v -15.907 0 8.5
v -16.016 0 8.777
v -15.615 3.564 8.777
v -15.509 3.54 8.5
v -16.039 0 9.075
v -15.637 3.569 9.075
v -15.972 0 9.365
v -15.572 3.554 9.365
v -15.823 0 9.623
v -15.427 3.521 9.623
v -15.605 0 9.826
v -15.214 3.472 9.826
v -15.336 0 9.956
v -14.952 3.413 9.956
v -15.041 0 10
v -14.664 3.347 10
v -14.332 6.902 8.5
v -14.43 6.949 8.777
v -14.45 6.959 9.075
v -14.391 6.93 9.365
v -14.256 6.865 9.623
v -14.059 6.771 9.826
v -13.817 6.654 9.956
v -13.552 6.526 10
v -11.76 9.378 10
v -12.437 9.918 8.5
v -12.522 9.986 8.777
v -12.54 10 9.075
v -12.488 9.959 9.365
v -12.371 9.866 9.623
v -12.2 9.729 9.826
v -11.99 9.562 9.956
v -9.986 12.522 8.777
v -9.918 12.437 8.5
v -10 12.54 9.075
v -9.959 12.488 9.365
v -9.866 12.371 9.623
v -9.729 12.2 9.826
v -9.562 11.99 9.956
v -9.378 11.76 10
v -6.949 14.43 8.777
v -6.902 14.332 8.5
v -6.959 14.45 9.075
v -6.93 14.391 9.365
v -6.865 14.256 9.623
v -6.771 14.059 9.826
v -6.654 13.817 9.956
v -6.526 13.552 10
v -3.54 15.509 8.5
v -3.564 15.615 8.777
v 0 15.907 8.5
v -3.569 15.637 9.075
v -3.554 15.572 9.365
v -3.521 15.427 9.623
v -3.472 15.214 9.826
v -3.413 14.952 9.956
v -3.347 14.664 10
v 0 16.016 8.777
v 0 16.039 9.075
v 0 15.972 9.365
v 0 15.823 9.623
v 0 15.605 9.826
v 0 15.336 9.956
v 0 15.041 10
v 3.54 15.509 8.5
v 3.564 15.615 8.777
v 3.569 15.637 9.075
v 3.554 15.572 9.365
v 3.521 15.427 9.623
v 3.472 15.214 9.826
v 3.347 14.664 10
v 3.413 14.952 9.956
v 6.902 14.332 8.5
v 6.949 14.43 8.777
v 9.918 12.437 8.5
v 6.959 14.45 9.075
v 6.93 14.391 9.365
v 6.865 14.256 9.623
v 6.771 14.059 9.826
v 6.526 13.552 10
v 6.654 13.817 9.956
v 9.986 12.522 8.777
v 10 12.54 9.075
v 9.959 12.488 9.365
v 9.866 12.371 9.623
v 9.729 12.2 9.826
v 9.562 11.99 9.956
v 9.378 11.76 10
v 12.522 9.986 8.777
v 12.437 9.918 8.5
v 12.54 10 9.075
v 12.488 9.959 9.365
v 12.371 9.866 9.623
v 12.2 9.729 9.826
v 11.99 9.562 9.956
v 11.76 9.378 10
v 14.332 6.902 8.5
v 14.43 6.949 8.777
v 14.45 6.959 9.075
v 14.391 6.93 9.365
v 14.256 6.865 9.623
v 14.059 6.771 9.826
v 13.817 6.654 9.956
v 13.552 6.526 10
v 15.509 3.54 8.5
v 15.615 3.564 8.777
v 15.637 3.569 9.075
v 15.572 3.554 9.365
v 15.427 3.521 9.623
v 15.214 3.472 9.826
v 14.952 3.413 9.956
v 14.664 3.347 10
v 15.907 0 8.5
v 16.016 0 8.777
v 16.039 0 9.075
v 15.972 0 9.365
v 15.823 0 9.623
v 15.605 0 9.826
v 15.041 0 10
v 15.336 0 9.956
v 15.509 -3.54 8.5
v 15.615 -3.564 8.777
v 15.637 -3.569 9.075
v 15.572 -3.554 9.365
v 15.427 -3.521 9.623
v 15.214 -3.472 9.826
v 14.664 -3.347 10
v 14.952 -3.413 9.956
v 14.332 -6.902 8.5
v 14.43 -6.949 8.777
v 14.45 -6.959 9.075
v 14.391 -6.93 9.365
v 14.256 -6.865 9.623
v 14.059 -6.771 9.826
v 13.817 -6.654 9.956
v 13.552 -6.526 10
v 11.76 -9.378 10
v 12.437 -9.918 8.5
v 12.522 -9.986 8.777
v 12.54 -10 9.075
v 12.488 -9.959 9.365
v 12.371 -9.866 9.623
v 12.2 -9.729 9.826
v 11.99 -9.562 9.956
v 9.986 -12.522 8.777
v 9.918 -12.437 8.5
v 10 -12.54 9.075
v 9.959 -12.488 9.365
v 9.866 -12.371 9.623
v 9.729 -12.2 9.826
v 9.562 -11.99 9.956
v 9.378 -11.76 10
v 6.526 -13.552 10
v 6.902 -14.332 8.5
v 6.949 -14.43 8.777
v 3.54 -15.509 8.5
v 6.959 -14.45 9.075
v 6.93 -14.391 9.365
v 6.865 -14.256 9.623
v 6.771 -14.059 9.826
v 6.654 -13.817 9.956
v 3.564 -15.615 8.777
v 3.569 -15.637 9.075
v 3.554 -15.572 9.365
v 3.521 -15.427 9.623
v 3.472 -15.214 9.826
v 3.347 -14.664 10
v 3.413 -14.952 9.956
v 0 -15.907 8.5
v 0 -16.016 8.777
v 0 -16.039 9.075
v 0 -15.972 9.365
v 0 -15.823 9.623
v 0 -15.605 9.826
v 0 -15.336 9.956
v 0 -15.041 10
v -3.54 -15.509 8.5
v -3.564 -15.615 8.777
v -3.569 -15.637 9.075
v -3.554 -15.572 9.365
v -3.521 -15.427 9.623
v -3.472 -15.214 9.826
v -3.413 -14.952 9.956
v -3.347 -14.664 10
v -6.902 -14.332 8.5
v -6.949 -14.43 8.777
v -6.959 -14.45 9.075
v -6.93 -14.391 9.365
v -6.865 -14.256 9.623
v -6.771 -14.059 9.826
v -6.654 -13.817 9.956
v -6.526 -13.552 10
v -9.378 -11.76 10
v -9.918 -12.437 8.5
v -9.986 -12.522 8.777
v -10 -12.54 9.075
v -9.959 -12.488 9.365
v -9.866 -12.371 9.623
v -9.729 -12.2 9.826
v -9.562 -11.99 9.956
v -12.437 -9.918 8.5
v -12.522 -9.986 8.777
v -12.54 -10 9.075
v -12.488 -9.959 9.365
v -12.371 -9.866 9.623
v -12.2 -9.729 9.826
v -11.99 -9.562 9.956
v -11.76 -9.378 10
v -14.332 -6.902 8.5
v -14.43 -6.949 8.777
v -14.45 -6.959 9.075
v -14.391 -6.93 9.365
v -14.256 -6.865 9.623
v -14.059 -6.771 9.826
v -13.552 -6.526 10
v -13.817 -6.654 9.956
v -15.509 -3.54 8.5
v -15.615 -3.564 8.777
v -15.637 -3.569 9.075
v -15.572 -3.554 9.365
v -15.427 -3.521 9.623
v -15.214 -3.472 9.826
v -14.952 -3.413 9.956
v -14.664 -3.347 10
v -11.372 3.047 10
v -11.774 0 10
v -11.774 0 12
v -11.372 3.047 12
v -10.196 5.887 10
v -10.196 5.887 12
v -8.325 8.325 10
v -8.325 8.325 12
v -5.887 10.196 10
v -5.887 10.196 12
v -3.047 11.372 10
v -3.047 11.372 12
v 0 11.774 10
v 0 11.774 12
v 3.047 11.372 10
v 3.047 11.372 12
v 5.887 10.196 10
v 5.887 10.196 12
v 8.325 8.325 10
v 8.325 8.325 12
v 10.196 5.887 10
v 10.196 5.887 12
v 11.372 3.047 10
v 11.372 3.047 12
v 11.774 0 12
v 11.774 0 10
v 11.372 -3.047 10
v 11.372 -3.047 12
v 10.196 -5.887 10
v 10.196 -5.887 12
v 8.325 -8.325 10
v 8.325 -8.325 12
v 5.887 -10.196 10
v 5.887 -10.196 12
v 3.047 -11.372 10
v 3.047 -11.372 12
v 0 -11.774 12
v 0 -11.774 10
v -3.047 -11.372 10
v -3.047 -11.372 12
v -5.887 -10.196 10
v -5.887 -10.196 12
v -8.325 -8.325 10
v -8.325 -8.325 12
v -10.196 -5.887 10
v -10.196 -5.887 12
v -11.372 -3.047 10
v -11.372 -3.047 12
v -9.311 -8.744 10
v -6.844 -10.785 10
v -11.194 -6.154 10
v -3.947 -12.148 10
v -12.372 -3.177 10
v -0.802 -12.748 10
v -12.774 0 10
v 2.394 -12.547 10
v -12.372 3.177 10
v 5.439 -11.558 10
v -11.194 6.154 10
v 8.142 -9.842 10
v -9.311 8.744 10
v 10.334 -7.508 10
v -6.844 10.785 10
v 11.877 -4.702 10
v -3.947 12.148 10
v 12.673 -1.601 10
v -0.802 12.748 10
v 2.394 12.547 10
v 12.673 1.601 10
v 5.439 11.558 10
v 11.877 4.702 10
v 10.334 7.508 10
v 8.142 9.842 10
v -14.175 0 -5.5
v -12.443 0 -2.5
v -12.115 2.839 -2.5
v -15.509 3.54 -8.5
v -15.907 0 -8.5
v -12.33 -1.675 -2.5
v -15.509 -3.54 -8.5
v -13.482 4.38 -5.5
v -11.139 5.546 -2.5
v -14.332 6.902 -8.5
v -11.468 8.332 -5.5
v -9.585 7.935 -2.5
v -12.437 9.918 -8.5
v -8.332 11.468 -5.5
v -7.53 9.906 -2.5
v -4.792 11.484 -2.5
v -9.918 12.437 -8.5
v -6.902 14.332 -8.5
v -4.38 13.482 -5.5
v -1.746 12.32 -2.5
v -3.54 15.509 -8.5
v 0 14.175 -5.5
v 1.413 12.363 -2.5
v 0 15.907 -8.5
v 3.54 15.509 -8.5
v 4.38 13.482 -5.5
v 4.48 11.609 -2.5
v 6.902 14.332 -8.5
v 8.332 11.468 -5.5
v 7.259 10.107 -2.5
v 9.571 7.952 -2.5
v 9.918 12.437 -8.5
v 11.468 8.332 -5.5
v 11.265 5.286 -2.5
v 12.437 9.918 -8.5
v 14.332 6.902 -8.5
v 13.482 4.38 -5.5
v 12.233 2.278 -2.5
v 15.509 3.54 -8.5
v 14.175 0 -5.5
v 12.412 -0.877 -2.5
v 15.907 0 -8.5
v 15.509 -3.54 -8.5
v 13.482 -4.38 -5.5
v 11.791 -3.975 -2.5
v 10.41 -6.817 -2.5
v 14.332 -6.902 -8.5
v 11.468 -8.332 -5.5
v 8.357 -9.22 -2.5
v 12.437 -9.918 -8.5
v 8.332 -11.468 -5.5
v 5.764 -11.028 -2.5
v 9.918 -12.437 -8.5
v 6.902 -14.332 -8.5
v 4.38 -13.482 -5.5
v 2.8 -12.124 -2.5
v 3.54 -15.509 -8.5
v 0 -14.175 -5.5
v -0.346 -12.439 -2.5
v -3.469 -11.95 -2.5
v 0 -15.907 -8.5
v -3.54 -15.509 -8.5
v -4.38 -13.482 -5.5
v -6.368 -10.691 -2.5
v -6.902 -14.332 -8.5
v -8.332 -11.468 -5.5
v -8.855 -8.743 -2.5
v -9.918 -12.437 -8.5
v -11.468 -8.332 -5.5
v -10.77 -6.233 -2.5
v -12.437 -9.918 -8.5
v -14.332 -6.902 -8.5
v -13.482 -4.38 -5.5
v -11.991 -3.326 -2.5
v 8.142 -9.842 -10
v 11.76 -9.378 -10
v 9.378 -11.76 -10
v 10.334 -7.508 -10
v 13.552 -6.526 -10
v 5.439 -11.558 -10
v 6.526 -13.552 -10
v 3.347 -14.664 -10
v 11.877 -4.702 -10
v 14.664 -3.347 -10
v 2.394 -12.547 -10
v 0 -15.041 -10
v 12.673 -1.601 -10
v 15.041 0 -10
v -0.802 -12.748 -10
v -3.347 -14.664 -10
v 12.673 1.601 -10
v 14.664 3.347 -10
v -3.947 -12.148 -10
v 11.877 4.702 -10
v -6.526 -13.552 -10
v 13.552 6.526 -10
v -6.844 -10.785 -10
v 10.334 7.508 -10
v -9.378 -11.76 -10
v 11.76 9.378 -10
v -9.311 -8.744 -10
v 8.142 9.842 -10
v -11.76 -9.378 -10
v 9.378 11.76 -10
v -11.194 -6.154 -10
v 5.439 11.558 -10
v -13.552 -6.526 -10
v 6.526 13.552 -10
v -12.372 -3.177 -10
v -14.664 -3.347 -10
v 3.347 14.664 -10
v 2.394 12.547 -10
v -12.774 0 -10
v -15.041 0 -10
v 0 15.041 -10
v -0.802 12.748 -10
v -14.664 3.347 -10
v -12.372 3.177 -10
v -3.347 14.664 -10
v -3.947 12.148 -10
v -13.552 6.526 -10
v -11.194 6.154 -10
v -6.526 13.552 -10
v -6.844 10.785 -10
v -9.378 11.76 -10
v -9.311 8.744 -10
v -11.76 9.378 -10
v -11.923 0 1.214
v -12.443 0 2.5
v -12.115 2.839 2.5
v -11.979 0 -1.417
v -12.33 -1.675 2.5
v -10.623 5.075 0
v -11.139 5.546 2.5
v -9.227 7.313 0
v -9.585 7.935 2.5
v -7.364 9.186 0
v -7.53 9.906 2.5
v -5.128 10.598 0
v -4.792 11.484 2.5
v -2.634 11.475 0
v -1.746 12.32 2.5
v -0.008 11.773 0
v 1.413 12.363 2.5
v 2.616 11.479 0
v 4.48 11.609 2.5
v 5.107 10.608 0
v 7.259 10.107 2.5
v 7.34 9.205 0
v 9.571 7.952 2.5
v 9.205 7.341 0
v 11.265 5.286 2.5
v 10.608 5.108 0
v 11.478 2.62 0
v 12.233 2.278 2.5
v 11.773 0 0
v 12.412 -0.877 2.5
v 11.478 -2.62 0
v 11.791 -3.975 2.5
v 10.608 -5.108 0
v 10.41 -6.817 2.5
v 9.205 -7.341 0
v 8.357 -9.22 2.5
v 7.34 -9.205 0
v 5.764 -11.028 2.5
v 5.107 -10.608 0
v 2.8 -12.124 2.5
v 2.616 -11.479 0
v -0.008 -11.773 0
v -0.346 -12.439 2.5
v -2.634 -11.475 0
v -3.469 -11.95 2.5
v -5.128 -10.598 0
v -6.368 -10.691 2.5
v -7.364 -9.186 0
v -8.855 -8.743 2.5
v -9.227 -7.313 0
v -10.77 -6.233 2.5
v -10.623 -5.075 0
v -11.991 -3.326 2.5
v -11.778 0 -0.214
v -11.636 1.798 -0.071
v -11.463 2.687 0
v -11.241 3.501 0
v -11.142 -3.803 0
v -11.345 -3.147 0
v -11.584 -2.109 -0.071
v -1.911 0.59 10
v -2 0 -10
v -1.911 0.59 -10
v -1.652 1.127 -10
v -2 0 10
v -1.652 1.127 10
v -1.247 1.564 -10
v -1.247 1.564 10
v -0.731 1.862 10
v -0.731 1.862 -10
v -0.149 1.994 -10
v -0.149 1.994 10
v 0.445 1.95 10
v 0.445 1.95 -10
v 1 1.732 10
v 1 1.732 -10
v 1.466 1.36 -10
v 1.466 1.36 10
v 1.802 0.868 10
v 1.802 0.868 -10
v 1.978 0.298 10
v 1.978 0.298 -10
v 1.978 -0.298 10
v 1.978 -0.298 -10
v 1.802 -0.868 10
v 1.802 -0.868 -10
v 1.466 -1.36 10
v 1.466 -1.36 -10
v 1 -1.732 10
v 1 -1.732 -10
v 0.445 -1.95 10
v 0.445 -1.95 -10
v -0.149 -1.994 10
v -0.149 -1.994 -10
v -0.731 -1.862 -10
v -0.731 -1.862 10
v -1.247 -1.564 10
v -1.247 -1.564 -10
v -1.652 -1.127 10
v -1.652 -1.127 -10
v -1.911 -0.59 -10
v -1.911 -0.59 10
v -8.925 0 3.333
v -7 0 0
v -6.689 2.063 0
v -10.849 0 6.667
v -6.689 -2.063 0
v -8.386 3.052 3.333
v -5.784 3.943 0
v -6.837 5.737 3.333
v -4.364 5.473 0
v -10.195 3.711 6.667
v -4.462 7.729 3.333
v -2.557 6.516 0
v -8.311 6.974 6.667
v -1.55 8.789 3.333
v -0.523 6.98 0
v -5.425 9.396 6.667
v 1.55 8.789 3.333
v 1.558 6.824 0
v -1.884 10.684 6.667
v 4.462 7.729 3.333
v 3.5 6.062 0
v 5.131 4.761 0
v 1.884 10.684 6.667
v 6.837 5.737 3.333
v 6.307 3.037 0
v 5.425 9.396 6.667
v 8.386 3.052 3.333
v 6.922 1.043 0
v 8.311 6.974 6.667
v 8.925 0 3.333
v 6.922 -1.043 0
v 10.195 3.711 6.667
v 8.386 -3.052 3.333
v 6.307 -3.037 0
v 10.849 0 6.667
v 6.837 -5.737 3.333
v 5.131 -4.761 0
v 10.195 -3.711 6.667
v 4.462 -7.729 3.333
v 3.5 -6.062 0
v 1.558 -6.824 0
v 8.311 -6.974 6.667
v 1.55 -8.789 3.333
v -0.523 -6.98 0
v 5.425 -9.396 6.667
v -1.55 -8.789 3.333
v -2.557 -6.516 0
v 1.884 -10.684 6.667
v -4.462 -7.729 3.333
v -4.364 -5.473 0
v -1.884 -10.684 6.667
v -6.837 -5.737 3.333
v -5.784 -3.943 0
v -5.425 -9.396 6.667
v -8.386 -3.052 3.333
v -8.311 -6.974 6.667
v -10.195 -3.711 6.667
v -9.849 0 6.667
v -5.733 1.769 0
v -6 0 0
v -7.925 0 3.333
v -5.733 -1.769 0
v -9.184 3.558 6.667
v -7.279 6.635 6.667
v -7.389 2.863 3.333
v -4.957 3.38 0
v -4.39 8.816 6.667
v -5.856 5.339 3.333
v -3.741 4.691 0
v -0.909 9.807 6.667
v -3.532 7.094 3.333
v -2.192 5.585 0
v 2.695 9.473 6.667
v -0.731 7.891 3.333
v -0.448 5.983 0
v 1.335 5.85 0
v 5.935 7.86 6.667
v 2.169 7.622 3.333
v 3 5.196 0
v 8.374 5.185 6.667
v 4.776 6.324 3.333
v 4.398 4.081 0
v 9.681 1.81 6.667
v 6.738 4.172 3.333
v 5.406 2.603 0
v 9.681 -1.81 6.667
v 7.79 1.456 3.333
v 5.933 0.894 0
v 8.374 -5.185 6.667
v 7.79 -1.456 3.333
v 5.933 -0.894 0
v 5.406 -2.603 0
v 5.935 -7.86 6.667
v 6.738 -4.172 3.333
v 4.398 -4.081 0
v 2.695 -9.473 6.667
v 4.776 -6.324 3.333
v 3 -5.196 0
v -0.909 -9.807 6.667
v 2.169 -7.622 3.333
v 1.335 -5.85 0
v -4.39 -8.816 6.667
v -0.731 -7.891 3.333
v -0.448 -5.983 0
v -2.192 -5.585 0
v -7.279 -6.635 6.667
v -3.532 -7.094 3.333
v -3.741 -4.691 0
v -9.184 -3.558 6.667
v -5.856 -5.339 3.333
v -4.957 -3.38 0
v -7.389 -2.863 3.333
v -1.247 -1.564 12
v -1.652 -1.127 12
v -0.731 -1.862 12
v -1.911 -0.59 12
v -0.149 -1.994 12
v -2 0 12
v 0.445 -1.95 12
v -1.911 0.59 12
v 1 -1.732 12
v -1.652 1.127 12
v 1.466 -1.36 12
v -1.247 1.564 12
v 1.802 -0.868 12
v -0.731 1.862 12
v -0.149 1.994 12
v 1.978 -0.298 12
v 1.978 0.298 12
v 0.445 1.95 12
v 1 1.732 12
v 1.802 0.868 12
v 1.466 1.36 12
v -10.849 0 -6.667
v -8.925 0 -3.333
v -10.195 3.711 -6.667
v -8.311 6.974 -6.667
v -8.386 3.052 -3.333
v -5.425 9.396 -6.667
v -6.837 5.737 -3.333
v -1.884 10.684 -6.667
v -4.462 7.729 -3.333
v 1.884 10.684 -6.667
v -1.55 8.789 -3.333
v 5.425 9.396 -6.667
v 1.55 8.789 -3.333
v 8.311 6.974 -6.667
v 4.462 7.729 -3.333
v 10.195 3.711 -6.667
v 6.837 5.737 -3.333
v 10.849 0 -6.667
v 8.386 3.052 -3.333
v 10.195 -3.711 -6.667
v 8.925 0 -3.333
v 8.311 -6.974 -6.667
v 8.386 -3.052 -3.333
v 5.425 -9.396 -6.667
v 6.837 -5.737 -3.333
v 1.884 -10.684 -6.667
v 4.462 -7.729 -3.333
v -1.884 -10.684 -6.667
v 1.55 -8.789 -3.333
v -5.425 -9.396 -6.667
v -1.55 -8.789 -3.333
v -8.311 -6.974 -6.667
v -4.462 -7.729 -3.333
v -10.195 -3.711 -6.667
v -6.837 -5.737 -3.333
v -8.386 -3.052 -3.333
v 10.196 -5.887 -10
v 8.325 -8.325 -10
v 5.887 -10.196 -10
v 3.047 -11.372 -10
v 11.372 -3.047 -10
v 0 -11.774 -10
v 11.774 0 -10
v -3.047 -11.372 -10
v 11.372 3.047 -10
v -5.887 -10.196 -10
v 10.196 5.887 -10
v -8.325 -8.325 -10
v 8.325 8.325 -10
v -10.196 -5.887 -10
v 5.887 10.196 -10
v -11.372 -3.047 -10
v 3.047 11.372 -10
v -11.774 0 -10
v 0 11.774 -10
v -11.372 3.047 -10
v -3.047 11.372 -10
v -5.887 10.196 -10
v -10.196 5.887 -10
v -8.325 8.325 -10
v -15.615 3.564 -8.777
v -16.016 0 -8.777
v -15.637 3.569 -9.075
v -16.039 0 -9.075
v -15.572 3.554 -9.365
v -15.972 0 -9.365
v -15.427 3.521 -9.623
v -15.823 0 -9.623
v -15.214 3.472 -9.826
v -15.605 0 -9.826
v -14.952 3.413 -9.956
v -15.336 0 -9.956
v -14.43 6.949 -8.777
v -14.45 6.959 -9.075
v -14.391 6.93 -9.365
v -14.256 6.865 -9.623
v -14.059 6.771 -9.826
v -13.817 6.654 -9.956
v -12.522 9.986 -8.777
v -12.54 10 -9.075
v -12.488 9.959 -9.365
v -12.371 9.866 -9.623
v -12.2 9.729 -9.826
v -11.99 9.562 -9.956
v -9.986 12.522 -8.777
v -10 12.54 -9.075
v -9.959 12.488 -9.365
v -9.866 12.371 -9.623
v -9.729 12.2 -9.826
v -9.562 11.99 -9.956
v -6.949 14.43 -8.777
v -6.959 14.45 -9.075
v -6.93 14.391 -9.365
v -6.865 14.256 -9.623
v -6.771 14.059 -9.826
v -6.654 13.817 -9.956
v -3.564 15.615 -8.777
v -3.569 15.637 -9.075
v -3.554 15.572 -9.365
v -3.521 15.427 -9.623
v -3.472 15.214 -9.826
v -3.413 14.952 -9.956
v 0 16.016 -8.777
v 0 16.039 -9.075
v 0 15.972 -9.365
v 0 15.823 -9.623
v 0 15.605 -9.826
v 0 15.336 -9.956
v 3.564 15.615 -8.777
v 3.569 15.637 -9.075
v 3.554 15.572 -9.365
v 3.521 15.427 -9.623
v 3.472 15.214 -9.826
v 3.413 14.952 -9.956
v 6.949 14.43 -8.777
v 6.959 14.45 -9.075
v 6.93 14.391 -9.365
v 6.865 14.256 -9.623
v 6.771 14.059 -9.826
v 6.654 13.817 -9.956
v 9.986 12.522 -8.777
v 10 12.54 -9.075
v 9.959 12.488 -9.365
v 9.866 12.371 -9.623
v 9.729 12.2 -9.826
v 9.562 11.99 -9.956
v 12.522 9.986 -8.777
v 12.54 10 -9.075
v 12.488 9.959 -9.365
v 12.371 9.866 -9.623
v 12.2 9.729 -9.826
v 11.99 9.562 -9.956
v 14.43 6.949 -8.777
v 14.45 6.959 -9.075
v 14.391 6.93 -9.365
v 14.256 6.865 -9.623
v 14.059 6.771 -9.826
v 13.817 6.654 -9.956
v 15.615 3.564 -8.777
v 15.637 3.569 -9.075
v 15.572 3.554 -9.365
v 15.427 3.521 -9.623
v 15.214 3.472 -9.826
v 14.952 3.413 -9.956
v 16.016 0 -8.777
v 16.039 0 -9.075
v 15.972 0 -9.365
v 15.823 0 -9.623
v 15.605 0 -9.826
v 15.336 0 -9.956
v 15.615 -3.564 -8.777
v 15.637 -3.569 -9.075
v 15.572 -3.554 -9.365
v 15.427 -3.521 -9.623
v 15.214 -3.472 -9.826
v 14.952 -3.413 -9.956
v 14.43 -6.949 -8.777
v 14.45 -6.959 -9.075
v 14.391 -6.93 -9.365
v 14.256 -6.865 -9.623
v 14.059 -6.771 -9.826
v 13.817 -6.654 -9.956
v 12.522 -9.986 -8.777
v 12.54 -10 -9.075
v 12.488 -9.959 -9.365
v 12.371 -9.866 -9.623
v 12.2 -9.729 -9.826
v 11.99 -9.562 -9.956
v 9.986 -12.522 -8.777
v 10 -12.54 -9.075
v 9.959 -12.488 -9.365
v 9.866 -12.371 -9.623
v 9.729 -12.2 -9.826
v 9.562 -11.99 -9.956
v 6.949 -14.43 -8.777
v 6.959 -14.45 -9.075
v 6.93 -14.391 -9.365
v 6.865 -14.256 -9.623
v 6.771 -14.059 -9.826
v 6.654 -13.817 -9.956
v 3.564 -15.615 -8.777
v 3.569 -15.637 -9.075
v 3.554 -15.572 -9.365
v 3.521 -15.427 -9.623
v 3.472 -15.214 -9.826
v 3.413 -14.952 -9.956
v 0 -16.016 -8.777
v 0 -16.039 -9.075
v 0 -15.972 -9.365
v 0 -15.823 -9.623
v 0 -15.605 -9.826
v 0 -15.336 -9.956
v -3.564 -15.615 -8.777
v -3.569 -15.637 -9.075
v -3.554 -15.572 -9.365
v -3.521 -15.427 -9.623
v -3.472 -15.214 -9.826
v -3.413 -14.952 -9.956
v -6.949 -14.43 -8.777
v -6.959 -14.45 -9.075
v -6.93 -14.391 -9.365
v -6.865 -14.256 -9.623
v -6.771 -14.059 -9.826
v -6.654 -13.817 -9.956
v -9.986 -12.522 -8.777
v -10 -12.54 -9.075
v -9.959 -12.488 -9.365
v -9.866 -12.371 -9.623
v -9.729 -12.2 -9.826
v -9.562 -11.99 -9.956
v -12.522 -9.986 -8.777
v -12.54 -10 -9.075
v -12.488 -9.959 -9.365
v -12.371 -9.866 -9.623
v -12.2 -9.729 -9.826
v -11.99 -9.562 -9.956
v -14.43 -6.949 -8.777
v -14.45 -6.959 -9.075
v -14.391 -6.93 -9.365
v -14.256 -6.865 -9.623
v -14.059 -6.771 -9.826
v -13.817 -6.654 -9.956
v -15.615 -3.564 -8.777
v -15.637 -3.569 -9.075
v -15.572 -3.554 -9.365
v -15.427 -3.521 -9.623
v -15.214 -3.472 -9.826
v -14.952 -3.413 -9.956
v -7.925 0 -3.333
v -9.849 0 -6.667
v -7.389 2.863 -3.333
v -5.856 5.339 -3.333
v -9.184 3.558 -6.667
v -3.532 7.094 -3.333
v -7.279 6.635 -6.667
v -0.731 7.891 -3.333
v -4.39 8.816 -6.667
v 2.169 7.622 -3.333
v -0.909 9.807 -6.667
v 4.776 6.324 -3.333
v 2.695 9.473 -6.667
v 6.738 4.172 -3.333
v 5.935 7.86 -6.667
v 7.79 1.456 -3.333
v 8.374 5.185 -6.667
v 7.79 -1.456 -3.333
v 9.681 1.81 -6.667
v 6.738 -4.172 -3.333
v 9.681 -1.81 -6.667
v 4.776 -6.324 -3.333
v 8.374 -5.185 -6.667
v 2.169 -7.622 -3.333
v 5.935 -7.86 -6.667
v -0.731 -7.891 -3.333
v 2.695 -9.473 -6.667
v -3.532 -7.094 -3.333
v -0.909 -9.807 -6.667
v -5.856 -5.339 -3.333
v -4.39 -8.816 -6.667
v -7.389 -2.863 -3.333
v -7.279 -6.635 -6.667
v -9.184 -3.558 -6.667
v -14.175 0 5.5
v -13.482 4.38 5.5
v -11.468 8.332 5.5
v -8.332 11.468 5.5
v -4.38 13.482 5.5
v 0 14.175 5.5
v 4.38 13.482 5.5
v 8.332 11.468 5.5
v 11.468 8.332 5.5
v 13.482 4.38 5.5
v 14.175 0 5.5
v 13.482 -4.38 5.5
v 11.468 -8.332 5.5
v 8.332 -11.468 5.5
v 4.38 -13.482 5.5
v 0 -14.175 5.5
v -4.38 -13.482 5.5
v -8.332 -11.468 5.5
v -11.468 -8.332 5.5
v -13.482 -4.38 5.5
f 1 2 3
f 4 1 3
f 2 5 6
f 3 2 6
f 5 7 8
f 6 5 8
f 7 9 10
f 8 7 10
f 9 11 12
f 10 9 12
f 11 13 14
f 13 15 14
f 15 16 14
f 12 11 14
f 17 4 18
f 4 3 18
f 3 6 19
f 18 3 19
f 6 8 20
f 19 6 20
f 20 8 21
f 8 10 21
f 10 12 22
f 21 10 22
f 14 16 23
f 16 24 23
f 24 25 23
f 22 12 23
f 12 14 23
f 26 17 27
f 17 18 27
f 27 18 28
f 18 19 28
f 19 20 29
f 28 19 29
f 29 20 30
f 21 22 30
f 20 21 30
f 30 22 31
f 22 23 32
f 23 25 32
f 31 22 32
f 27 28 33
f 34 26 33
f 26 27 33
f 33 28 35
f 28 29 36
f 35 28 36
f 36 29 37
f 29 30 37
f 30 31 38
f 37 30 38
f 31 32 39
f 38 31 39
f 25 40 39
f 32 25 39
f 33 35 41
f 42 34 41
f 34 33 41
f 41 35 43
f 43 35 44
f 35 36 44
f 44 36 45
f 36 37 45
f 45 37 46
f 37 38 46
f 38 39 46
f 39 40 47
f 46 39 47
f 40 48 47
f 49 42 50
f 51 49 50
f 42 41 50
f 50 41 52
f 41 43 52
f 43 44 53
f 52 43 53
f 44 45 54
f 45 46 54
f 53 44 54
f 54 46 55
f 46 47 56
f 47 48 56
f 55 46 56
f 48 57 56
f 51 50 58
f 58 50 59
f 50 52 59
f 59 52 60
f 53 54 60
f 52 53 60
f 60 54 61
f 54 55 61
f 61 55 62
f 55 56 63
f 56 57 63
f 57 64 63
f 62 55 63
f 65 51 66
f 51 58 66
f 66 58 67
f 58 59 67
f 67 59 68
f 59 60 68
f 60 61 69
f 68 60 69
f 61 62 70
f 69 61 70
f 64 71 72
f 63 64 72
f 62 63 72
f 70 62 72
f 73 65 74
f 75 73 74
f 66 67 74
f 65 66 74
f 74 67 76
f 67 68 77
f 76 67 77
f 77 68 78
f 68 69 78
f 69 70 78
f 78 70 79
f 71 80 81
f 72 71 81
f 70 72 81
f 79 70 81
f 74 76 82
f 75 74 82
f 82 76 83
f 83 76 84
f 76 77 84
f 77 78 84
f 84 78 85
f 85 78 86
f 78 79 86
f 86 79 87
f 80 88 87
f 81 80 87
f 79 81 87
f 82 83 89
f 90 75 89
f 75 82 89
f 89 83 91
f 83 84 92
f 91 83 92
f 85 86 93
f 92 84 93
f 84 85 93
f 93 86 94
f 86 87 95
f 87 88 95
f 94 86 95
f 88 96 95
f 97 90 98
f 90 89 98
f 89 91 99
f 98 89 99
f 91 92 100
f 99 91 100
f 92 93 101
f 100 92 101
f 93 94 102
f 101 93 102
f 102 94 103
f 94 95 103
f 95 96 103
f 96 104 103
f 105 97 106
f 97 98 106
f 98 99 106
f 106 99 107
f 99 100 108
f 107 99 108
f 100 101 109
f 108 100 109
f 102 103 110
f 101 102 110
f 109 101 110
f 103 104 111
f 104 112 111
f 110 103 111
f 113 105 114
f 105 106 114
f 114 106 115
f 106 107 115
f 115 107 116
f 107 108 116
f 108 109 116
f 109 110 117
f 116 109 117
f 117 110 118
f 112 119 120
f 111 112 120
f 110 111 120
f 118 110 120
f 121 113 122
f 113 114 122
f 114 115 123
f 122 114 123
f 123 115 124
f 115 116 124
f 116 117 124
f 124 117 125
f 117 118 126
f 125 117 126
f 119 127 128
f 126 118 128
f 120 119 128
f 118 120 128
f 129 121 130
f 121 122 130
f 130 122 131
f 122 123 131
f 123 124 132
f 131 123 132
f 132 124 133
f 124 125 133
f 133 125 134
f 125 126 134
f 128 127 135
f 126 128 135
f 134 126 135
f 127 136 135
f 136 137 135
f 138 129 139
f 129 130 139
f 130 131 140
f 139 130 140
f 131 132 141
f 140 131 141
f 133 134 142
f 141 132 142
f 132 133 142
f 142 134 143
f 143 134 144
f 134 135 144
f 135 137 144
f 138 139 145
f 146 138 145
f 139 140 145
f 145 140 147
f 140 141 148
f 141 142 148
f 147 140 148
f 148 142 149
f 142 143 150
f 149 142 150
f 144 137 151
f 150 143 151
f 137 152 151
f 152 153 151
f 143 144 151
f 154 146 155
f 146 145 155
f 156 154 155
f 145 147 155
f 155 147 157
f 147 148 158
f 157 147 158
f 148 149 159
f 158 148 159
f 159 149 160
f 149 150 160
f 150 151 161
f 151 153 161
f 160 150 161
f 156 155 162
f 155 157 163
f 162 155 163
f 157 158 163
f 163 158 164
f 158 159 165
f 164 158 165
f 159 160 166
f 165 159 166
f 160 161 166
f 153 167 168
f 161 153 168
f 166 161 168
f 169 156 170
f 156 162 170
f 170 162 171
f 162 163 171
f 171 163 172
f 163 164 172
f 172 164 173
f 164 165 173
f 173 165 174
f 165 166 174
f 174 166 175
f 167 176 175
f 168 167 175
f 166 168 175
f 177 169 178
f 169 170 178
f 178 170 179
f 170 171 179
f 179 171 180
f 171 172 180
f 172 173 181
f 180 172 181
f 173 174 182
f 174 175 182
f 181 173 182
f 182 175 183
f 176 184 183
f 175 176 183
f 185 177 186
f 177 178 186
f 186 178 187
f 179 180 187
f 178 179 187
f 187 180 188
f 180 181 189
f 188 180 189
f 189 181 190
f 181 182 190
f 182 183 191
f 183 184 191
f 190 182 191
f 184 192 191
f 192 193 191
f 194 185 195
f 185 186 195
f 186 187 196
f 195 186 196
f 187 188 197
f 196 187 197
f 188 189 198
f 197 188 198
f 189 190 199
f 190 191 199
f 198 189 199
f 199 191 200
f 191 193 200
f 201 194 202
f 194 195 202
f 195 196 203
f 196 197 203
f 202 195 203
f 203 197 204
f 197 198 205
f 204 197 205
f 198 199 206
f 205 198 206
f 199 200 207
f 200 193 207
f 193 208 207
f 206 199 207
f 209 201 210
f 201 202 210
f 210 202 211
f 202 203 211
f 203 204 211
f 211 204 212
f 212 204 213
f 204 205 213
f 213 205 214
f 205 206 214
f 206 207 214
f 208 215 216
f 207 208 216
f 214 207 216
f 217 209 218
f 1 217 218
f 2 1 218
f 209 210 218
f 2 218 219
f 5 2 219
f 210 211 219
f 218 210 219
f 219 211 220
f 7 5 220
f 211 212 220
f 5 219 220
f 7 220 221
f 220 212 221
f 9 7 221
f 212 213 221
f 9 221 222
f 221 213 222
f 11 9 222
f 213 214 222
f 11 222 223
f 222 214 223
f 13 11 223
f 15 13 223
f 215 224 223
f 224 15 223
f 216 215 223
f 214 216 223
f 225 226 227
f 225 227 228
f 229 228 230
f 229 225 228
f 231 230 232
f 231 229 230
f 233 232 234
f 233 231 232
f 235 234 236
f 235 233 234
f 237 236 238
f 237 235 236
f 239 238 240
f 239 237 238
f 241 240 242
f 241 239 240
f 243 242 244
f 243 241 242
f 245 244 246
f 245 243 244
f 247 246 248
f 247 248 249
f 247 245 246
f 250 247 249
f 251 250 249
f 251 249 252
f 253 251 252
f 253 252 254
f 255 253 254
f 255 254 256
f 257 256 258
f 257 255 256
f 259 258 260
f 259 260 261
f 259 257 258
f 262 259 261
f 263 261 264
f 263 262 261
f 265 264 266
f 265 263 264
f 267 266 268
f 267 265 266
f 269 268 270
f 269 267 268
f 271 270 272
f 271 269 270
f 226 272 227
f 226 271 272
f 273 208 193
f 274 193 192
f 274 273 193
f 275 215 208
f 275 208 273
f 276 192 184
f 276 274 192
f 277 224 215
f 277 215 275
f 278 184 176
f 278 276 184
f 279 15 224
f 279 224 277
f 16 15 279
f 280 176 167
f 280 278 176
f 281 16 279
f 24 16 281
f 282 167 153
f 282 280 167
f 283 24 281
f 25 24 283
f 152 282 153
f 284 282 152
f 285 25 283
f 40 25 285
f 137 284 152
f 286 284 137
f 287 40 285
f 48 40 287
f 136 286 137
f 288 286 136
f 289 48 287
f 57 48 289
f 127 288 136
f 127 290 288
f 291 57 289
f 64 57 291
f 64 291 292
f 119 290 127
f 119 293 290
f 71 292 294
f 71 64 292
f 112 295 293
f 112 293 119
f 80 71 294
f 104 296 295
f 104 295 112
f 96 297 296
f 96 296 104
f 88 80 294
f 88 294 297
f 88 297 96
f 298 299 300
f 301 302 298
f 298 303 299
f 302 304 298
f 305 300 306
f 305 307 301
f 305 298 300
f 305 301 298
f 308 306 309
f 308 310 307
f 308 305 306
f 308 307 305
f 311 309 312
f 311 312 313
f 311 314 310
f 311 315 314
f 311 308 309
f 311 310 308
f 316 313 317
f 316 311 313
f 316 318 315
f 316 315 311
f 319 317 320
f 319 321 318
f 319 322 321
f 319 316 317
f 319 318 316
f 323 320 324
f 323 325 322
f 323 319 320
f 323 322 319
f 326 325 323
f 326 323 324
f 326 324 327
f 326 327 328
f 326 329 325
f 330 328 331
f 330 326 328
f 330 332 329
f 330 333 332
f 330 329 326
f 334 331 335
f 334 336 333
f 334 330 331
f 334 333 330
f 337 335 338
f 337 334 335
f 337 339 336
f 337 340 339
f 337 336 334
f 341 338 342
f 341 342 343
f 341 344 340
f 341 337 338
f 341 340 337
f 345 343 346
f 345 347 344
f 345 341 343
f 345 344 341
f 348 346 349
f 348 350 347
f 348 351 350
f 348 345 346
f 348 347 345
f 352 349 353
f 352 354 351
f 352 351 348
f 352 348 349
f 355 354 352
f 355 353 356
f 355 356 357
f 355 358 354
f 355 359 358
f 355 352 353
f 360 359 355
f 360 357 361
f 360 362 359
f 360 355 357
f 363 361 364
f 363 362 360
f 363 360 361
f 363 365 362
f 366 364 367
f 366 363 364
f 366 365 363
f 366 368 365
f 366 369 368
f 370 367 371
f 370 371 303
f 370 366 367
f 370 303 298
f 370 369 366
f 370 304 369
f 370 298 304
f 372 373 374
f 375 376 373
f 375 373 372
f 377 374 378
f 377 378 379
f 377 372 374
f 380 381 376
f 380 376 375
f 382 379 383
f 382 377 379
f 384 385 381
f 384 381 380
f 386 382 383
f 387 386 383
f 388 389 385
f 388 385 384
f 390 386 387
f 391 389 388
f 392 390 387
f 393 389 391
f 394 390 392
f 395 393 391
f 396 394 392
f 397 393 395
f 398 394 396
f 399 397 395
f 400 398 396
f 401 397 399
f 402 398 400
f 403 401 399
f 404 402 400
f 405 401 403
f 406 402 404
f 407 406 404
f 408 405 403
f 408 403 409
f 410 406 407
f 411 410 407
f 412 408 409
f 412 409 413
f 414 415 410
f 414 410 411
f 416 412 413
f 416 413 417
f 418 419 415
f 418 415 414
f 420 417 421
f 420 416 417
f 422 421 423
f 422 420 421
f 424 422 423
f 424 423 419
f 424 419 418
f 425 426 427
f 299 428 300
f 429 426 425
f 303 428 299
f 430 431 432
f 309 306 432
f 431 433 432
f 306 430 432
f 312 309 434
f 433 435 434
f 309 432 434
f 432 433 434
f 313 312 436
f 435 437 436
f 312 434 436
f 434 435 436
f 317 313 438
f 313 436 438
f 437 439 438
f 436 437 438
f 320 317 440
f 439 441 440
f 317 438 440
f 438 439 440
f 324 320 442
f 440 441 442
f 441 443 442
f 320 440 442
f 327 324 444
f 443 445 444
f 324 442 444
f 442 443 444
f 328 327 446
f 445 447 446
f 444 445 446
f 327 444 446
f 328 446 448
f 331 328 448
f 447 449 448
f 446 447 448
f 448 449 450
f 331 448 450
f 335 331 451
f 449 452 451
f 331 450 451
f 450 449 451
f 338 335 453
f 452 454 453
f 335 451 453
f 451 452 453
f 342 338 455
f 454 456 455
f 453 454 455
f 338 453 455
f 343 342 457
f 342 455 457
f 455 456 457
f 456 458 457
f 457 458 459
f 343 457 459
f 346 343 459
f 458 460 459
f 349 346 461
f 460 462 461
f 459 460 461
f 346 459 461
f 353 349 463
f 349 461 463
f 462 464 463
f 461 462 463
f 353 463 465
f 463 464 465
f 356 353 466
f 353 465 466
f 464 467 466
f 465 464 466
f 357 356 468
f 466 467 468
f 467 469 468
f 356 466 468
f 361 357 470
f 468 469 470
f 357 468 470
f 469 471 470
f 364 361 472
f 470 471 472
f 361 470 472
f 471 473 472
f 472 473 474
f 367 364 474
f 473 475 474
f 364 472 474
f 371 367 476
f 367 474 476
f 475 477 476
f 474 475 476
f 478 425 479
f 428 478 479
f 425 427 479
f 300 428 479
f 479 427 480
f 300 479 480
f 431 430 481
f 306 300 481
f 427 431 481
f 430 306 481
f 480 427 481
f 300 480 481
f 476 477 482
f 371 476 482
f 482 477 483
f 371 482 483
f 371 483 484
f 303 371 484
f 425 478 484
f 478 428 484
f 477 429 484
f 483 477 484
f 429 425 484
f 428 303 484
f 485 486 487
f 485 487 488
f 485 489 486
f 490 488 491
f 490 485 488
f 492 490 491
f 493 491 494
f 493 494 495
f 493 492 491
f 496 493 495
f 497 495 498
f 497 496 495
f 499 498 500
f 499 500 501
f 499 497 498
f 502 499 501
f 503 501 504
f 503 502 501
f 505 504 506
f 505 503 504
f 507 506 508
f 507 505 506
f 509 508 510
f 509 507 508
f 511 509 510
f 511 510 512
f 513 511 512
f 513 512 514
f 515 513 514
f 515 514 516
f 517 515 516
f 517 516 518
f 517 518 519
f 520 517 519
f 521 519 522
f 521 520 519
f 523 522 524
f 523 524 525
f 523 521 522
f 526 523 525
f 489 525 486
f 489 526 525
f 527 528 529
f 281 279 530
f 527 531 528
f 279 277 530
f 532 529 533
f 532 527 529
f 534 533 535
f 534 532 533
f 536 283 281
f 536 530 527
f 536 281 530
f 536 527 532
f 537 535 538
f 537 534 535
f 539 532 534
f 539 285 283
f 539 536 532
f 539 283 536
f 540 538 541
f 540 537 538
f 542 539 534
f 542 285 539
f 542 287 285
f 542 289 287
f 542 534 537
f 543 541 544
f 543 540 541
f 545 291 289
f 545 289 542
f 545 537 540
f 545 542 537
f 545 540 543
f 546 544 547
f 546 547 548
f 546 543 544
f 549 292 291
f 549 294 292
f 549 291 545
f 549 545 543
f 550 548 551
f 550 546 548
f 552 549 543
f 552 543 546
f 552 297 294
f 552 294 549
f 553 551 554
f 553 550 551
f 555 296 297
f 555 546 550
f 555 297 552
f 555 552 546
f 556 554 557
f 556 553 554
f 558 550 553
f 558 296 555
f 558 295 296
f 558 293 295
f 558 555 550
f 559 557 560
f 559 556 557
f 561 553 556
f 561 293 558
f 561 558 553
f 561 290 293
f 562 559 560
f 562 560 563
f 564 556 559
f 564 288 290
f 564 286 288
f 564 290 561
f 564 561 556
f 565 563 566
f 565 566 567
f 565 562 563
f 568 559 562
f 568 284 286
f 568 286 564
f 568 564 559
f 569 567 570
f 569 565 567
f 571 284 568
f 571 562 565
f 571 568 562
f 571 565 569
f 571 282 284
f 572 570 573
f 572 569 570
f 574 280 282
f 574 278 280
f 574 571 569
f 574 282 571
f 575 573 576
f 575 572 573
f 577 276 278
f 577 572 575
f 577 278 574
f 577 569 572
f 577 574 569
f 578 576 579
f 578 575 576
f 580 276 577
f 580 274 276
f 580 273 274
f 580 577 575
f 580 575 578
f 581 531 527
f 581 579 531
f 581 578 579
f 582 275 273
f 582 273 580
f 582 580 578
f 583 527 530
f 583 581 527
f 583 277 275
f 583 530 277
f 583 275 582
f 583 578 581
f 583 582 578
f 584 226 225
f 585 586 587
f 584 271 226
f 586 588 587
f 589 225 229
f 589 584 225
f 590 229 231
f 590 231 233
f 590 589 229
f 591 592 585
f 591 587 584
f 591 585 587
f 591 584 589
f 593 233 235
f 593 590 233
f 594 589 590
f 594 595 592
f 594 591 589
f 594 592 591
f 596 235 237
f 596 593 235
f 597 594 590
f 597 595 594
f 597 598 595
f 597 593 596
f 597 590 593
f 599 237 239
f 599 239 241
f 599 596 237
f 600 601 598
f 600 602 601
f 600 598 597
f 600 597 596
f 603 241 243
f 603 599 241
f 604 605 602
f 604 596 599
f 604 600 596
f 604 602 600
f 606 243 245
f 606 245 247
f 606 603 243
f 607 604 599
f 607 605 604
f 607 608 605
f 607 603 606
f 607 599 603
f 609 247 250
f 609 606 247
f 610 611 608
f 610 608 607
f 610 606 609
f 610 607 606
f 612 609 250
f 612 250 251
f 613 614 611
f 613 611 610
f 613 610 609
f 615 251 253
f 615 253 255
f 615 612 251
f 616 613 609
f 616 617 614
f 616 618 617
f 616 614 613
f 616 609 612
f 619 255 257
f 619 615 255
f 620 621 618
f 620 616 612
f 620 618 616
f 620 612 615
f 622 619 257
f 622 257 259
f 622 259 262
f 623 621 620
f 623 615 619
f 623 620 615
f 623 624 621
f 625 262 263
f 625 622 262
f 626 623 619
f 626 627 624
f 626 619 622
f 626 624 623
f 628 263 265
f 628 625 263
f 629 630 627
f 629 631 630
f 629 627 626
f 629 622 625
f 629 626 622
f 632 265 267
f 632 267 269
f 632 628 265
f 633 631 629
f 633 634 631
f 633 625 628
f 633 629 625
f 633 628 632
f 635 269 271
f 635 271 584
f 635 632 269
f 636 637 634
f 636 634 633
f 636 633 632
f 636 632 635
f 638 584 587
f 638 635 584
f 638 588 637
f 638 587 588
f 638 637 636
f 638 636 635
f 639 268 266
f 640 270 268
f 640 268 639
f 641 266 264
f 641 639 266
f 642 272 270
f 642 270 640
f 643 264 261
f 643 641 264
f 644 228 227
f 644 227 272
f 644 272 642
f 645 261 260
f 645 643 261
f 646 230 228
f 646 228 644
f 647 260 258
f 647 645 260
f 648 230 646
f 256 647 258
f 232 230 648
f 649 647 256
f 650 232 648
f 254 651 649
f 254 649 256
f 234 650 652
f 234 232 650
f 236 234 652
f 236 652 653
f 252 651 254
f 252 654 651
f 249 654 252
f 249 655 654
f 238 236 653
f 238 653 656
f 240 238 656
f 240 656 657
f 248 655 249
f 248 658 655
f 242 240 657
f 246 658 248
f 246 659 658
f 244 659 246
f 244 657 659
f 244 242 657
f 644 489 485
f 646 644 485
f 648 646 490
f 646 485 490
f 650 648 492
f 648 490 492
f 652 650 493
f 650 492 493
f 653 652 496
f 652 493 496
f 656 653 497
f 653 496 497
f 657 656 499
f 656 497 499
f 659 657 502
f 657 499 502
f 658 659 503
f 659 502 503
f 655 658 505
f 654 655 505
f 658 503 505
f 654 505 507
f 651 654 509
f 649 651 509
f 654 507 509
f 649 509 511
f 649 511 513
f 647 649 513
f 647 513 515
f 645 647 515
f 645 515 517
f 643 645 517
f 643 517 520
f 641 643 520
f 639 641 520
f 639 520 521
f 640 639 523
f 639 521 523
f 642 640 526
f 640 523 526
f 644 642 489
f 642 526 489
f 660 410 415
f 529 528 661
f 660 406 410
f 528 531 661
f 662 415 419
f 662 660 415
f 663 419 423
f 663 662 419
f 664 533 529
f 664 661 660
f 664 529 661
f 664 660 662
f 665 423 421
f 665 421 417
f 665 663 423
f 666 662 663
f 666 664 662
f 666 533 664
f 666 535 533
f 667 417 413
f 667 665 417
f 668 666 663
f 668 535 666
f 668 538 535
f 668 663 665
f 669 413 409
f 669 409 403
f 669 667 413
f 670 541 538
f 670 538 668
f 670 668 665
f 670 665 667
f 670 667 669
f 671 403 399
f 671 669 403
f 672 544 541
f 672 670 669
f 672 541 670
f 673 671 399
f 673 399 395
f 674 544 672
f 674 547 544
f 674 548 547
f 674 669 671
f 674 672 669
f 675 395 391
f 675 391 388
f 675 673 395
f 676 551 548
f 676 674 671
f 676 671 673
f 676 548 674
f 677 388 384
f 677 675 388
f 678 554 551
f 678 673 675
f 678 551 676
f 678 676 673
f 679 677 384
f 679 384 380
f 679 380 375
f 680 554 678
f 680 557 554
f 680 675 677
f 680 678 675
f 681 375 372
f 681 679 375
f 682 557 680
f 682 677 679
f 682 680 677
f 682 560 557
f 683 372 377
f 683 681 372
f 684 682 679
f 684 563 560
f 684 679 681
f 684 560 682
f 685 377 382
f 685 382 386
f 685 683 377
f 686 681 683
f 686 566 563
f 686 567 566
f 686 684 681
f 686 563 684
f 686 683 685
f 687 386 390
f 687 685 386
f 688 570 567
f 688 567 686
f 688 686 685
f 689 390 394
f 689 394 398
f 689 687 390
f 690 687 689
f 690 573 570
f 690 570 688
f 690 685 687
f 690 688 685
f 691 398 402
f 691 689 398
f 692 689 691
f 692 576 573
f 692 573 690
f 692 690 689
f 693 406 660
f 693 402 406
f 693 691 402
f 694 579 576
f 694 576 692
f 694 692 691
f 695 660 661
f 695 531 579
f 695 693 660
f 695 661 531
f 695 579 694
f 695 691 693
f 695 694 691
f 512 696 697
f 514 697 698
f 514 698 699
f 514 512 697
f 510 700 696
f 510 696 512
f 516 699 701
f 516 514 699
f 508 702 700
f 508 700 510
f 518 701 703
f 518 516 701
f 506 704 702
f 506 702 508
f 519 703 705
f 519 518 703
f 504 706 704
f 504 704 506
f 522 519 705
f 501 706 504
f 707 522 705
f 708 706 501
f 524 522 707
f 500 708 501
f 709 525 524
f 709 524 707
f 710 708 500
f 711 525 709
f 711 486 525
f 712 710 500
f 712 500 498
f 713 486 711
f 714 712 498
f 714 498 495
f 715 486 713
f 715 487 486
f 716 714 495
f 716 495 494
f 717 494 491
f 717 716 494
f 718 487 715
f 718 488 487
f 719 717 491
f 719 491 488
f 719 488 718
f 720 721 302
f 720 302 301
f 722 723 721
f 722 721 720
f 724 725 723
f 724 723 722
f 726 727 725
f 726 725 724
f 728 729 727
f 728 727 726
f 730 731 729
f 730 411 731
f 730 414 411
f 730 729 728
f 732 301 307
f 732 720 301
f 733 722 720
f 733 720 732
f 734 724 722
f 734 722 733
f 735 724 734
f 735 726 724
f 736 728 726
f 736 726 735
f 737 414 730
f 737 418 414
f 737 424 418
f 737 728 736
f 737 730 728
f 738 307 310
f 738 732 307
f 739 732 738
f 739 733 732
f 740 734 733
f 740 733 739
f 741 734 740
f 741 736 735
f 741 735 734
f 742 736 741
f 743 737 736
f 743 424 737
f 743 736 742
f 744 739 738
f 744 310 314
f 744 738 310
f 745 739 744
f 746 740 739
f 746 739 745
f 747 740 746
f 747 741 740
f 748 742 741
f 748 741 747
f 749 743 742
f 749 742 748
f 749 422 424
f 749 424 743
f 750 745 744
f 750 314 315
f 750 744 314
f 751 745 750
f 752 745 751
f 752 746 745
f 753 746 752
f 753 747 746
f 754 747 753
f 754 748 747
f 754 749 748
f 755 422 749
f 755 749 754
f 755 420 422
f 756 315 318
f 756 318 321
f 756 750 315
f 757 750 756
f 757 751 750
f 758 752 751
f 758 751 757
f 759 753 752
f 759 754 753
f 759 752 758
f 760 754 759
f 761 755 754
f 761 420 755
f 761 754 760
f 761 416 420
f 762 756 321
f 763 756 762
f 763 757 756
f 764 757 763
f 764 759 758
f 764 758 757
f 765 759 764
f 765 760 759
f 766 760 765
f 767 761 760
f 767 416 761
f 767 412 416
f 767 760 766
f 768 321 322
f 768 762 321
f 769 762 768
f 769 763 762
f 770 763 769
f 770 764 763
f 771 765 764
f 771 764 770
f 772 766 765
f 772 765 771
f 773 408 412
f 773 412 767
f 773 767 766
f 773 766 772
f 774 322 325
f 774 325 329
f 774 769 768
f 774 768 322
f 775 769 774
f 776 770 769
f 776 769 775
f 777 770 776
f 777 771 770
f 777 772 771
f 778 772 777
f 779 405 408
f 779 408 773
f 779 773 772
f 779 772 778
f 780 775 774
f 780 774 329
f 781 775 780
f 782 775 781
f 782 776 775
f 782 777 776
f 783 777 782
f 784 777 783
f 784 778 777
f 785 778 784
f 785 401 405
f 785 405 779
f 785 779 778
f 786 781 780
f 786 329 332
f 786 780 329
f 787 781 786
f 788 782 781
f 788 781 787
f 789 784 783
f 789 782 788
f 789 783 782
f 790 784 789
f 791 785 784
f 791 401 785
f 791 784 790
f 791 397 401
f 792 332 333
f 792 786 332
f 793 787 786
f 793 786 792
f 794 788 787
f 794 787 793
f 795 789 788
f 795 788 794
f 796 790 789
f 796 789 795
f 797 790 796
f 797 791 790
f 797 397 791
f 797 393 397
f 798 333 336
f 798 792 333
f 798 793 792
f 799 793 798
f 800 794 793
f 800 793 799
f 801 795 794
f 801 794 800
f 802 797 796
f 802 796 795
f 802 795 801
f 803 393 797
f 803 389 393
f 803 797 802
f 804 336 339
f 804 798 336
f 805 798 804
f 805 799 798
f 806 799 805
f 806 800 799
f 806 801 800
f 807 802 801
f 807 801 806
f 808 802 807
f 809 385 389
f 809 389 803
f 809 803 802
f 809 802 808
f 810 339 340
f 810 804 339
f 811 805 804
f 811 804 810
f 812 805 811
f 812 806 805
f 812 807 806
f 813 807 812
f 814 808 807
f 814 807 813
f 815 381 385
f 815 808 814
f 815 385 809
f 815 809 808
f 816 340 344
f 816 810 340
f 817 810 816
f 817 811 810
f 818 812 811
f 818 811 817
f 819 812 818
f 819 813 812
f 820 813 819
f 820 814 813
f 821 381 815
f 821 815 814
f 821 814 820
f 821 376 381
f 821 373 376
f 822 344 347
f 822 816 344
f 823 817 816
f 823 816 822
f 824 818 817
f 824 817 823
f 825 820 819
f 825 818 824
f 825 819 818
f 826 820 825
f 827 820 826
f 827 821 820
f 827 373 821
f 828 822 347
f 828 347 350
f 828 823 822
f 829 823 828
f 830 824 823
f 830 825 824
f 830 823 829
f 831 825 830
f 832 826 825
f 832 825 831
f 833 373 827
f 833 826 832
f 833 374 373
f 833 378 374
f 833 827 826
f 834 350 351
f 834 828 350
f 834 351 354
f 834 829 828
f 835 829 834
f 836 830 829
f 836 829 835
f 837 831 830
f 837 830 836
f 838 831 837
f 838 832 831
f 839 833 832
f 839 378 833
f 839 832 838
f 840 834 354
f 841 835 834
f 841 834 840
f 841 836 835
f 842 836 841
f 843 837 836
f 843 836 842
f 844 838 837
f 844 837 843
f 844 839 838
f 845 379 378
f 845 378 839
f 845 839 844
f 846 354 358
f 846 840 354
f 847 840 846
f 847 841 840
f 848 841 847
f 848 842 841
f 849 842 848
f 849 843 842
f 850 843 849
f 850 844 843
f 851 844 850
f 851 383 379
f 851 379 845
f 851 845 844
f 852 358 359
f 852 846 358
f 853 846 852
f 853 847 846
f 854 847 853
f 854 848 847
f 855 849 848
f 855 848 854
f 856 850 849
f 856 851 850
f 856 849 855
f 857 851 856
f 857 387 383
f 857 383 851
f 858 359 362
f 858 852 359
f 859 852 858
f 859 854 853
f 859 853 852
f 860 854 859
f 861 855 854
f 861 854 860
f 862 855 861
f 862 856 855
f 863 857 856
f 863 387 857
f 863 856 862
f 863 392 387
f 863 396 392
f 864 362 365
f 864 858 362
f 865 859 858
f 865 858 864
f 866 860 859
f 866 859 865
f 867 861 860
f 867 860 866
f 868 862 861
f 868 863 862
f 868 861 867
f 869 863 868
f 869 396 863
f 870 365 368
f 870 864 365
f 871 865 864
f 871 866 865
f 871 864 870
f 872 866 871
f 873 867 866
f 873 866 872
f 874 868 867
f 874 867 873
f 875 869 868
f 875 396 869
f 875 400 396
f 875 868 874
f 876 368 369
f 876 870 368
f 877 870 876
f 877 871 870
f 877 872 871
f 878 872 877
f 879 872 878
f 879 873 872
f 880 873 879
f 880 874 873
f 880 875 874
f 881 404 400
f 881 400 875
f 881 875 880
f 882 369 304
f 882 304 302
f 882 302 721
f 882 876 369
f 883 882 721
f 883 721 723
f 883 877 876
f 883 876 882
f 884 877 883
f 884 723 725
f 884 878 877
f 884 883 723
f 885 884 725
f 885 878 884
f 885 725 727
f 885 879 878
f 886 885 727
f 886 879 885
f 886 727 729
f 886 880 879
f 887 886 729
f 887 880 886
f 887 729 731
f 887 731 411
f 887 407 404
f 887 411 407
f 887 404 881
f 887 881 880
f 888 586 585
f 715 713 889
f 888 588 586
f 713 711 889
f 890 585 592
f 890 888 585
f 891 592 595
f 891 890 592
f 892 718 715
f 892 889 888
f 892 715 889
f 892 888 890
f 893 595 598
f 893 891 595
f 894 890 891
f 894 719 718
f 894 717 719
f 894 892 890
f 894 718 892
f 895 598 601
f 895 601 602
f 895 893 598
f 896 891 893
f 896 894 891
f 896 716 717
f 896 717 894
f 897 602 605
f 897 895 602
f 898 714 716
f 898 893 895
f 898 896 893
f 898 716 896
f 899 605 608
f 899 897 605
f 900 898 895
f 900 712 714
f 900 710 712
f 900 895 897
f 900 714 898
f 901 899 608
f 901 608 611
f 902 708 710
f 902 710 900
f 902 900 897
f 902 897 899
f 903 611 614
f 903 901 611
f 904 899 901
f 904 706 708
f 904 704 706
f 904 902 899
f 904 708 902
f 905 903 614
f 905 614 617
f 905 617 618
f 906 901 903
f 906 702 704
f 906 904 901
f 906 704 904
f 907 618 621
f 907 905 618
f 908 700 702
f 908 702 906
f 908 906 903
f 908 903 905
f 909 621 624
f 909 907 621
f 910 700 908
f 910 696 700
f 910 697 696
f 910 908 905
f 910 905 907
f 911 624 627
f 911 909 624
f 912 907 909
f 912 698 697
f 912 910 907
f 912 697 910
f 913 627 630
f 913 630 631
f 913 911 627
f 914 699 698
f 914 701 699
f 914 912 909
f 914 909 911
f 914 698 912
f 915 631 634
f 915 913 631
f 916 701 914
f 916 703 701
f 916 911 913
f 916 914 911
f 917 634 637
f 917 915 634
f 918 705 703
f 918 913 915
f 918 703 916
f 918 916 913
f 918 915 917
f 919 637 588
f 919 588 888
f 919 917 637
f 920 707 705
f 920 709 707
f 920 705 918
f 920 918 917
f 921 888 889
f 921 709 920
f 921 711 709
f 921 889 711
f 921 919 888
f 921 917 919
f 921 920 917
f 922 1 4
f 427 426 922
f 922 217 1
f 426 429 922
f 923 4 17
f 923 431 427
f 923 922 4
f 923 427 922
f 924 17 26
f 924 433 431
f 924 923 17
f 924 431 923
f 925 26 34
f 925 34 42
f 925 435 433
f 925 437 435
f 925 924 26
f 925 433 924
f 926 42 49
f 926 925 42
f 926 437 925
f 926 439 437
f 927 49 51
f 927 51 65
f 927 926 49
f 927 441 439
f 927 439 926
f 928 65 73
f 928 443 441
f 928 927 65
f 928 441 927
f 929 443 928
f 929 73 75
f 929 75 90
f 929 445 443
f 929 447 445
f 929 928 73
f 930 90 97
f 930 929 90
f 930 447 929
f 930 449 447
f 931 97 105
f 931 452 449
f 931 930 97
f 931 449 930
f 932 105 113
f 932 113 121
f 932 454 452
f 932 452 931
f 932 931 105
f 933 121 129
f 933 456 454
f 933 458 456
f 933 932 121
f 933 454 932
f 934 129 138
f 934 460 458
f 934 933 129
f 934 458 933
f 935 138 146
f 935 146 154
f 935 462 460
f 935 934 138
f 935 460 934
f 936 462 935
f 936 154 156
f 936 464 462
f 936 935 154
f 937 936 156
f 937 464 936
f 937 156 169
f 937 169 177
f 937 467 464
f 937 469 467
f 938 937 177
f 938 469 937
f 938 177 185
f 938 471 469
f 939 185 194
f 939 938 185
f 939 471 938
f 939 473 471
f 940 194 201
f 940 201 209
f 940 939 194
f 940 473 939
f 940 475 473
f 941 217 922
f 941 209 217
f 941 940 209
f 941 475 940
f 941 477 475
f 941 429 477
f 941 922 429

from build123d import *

# Parameters (mm, degrees)
F2_R     = 5
F3_R     = 1
F4_DEPTH = 2


with BuildPart() as f1:
    # F0 (on Front) → F1 (revolve)
    with BuildSketch(Plane.XZ):
        Polygon((-2, -10), (-2, 10), (-11.7735026919, 10), (-6, 0), (-11.7735026919, -10), align=None)
    revolve(axis=Axis((0, 0, 0), (0, 0, -1)))

    # F4 (add): a face of the model
    f4_faces = [f1.faces().sort_by_distance(p)[0] for p in [
        (2.3330049437, 0, 10),
    ]]
    extrude(f4_faces, amount=F4_DEPTH)


with BuildPart() as f1b:
    # F0 (on Front) → F1, piece 2 (revolve)
    with BuildSketch(Plane.XZ):
        Polygon((-7, 0), (-12.7735026919, 10), (-16.7735026919, 10), (-11, 0), (-16.7735026919, -10), (-12.7735026919, -10), align=None)
    revolve(axis=Axis((0, 0, 0), (0, 0, -1)))

    # F2
    f2_edges = [f1b.edges().sort_by_distance(p)[0] for p in [
        (11, 0, 0),
    ]]
    fillet(f2_edges, radius=F2_R)

    # F3
    f3_edges = [f1b.edges().sort_by_distance(p)[0] for p in [
        (16.773503, 0, 10),
        (16.773503, 0, -10),
    ]]
    fillet(f3_edges, radius=F3_R)


solid = Compound([f1.part, f1b.part])
